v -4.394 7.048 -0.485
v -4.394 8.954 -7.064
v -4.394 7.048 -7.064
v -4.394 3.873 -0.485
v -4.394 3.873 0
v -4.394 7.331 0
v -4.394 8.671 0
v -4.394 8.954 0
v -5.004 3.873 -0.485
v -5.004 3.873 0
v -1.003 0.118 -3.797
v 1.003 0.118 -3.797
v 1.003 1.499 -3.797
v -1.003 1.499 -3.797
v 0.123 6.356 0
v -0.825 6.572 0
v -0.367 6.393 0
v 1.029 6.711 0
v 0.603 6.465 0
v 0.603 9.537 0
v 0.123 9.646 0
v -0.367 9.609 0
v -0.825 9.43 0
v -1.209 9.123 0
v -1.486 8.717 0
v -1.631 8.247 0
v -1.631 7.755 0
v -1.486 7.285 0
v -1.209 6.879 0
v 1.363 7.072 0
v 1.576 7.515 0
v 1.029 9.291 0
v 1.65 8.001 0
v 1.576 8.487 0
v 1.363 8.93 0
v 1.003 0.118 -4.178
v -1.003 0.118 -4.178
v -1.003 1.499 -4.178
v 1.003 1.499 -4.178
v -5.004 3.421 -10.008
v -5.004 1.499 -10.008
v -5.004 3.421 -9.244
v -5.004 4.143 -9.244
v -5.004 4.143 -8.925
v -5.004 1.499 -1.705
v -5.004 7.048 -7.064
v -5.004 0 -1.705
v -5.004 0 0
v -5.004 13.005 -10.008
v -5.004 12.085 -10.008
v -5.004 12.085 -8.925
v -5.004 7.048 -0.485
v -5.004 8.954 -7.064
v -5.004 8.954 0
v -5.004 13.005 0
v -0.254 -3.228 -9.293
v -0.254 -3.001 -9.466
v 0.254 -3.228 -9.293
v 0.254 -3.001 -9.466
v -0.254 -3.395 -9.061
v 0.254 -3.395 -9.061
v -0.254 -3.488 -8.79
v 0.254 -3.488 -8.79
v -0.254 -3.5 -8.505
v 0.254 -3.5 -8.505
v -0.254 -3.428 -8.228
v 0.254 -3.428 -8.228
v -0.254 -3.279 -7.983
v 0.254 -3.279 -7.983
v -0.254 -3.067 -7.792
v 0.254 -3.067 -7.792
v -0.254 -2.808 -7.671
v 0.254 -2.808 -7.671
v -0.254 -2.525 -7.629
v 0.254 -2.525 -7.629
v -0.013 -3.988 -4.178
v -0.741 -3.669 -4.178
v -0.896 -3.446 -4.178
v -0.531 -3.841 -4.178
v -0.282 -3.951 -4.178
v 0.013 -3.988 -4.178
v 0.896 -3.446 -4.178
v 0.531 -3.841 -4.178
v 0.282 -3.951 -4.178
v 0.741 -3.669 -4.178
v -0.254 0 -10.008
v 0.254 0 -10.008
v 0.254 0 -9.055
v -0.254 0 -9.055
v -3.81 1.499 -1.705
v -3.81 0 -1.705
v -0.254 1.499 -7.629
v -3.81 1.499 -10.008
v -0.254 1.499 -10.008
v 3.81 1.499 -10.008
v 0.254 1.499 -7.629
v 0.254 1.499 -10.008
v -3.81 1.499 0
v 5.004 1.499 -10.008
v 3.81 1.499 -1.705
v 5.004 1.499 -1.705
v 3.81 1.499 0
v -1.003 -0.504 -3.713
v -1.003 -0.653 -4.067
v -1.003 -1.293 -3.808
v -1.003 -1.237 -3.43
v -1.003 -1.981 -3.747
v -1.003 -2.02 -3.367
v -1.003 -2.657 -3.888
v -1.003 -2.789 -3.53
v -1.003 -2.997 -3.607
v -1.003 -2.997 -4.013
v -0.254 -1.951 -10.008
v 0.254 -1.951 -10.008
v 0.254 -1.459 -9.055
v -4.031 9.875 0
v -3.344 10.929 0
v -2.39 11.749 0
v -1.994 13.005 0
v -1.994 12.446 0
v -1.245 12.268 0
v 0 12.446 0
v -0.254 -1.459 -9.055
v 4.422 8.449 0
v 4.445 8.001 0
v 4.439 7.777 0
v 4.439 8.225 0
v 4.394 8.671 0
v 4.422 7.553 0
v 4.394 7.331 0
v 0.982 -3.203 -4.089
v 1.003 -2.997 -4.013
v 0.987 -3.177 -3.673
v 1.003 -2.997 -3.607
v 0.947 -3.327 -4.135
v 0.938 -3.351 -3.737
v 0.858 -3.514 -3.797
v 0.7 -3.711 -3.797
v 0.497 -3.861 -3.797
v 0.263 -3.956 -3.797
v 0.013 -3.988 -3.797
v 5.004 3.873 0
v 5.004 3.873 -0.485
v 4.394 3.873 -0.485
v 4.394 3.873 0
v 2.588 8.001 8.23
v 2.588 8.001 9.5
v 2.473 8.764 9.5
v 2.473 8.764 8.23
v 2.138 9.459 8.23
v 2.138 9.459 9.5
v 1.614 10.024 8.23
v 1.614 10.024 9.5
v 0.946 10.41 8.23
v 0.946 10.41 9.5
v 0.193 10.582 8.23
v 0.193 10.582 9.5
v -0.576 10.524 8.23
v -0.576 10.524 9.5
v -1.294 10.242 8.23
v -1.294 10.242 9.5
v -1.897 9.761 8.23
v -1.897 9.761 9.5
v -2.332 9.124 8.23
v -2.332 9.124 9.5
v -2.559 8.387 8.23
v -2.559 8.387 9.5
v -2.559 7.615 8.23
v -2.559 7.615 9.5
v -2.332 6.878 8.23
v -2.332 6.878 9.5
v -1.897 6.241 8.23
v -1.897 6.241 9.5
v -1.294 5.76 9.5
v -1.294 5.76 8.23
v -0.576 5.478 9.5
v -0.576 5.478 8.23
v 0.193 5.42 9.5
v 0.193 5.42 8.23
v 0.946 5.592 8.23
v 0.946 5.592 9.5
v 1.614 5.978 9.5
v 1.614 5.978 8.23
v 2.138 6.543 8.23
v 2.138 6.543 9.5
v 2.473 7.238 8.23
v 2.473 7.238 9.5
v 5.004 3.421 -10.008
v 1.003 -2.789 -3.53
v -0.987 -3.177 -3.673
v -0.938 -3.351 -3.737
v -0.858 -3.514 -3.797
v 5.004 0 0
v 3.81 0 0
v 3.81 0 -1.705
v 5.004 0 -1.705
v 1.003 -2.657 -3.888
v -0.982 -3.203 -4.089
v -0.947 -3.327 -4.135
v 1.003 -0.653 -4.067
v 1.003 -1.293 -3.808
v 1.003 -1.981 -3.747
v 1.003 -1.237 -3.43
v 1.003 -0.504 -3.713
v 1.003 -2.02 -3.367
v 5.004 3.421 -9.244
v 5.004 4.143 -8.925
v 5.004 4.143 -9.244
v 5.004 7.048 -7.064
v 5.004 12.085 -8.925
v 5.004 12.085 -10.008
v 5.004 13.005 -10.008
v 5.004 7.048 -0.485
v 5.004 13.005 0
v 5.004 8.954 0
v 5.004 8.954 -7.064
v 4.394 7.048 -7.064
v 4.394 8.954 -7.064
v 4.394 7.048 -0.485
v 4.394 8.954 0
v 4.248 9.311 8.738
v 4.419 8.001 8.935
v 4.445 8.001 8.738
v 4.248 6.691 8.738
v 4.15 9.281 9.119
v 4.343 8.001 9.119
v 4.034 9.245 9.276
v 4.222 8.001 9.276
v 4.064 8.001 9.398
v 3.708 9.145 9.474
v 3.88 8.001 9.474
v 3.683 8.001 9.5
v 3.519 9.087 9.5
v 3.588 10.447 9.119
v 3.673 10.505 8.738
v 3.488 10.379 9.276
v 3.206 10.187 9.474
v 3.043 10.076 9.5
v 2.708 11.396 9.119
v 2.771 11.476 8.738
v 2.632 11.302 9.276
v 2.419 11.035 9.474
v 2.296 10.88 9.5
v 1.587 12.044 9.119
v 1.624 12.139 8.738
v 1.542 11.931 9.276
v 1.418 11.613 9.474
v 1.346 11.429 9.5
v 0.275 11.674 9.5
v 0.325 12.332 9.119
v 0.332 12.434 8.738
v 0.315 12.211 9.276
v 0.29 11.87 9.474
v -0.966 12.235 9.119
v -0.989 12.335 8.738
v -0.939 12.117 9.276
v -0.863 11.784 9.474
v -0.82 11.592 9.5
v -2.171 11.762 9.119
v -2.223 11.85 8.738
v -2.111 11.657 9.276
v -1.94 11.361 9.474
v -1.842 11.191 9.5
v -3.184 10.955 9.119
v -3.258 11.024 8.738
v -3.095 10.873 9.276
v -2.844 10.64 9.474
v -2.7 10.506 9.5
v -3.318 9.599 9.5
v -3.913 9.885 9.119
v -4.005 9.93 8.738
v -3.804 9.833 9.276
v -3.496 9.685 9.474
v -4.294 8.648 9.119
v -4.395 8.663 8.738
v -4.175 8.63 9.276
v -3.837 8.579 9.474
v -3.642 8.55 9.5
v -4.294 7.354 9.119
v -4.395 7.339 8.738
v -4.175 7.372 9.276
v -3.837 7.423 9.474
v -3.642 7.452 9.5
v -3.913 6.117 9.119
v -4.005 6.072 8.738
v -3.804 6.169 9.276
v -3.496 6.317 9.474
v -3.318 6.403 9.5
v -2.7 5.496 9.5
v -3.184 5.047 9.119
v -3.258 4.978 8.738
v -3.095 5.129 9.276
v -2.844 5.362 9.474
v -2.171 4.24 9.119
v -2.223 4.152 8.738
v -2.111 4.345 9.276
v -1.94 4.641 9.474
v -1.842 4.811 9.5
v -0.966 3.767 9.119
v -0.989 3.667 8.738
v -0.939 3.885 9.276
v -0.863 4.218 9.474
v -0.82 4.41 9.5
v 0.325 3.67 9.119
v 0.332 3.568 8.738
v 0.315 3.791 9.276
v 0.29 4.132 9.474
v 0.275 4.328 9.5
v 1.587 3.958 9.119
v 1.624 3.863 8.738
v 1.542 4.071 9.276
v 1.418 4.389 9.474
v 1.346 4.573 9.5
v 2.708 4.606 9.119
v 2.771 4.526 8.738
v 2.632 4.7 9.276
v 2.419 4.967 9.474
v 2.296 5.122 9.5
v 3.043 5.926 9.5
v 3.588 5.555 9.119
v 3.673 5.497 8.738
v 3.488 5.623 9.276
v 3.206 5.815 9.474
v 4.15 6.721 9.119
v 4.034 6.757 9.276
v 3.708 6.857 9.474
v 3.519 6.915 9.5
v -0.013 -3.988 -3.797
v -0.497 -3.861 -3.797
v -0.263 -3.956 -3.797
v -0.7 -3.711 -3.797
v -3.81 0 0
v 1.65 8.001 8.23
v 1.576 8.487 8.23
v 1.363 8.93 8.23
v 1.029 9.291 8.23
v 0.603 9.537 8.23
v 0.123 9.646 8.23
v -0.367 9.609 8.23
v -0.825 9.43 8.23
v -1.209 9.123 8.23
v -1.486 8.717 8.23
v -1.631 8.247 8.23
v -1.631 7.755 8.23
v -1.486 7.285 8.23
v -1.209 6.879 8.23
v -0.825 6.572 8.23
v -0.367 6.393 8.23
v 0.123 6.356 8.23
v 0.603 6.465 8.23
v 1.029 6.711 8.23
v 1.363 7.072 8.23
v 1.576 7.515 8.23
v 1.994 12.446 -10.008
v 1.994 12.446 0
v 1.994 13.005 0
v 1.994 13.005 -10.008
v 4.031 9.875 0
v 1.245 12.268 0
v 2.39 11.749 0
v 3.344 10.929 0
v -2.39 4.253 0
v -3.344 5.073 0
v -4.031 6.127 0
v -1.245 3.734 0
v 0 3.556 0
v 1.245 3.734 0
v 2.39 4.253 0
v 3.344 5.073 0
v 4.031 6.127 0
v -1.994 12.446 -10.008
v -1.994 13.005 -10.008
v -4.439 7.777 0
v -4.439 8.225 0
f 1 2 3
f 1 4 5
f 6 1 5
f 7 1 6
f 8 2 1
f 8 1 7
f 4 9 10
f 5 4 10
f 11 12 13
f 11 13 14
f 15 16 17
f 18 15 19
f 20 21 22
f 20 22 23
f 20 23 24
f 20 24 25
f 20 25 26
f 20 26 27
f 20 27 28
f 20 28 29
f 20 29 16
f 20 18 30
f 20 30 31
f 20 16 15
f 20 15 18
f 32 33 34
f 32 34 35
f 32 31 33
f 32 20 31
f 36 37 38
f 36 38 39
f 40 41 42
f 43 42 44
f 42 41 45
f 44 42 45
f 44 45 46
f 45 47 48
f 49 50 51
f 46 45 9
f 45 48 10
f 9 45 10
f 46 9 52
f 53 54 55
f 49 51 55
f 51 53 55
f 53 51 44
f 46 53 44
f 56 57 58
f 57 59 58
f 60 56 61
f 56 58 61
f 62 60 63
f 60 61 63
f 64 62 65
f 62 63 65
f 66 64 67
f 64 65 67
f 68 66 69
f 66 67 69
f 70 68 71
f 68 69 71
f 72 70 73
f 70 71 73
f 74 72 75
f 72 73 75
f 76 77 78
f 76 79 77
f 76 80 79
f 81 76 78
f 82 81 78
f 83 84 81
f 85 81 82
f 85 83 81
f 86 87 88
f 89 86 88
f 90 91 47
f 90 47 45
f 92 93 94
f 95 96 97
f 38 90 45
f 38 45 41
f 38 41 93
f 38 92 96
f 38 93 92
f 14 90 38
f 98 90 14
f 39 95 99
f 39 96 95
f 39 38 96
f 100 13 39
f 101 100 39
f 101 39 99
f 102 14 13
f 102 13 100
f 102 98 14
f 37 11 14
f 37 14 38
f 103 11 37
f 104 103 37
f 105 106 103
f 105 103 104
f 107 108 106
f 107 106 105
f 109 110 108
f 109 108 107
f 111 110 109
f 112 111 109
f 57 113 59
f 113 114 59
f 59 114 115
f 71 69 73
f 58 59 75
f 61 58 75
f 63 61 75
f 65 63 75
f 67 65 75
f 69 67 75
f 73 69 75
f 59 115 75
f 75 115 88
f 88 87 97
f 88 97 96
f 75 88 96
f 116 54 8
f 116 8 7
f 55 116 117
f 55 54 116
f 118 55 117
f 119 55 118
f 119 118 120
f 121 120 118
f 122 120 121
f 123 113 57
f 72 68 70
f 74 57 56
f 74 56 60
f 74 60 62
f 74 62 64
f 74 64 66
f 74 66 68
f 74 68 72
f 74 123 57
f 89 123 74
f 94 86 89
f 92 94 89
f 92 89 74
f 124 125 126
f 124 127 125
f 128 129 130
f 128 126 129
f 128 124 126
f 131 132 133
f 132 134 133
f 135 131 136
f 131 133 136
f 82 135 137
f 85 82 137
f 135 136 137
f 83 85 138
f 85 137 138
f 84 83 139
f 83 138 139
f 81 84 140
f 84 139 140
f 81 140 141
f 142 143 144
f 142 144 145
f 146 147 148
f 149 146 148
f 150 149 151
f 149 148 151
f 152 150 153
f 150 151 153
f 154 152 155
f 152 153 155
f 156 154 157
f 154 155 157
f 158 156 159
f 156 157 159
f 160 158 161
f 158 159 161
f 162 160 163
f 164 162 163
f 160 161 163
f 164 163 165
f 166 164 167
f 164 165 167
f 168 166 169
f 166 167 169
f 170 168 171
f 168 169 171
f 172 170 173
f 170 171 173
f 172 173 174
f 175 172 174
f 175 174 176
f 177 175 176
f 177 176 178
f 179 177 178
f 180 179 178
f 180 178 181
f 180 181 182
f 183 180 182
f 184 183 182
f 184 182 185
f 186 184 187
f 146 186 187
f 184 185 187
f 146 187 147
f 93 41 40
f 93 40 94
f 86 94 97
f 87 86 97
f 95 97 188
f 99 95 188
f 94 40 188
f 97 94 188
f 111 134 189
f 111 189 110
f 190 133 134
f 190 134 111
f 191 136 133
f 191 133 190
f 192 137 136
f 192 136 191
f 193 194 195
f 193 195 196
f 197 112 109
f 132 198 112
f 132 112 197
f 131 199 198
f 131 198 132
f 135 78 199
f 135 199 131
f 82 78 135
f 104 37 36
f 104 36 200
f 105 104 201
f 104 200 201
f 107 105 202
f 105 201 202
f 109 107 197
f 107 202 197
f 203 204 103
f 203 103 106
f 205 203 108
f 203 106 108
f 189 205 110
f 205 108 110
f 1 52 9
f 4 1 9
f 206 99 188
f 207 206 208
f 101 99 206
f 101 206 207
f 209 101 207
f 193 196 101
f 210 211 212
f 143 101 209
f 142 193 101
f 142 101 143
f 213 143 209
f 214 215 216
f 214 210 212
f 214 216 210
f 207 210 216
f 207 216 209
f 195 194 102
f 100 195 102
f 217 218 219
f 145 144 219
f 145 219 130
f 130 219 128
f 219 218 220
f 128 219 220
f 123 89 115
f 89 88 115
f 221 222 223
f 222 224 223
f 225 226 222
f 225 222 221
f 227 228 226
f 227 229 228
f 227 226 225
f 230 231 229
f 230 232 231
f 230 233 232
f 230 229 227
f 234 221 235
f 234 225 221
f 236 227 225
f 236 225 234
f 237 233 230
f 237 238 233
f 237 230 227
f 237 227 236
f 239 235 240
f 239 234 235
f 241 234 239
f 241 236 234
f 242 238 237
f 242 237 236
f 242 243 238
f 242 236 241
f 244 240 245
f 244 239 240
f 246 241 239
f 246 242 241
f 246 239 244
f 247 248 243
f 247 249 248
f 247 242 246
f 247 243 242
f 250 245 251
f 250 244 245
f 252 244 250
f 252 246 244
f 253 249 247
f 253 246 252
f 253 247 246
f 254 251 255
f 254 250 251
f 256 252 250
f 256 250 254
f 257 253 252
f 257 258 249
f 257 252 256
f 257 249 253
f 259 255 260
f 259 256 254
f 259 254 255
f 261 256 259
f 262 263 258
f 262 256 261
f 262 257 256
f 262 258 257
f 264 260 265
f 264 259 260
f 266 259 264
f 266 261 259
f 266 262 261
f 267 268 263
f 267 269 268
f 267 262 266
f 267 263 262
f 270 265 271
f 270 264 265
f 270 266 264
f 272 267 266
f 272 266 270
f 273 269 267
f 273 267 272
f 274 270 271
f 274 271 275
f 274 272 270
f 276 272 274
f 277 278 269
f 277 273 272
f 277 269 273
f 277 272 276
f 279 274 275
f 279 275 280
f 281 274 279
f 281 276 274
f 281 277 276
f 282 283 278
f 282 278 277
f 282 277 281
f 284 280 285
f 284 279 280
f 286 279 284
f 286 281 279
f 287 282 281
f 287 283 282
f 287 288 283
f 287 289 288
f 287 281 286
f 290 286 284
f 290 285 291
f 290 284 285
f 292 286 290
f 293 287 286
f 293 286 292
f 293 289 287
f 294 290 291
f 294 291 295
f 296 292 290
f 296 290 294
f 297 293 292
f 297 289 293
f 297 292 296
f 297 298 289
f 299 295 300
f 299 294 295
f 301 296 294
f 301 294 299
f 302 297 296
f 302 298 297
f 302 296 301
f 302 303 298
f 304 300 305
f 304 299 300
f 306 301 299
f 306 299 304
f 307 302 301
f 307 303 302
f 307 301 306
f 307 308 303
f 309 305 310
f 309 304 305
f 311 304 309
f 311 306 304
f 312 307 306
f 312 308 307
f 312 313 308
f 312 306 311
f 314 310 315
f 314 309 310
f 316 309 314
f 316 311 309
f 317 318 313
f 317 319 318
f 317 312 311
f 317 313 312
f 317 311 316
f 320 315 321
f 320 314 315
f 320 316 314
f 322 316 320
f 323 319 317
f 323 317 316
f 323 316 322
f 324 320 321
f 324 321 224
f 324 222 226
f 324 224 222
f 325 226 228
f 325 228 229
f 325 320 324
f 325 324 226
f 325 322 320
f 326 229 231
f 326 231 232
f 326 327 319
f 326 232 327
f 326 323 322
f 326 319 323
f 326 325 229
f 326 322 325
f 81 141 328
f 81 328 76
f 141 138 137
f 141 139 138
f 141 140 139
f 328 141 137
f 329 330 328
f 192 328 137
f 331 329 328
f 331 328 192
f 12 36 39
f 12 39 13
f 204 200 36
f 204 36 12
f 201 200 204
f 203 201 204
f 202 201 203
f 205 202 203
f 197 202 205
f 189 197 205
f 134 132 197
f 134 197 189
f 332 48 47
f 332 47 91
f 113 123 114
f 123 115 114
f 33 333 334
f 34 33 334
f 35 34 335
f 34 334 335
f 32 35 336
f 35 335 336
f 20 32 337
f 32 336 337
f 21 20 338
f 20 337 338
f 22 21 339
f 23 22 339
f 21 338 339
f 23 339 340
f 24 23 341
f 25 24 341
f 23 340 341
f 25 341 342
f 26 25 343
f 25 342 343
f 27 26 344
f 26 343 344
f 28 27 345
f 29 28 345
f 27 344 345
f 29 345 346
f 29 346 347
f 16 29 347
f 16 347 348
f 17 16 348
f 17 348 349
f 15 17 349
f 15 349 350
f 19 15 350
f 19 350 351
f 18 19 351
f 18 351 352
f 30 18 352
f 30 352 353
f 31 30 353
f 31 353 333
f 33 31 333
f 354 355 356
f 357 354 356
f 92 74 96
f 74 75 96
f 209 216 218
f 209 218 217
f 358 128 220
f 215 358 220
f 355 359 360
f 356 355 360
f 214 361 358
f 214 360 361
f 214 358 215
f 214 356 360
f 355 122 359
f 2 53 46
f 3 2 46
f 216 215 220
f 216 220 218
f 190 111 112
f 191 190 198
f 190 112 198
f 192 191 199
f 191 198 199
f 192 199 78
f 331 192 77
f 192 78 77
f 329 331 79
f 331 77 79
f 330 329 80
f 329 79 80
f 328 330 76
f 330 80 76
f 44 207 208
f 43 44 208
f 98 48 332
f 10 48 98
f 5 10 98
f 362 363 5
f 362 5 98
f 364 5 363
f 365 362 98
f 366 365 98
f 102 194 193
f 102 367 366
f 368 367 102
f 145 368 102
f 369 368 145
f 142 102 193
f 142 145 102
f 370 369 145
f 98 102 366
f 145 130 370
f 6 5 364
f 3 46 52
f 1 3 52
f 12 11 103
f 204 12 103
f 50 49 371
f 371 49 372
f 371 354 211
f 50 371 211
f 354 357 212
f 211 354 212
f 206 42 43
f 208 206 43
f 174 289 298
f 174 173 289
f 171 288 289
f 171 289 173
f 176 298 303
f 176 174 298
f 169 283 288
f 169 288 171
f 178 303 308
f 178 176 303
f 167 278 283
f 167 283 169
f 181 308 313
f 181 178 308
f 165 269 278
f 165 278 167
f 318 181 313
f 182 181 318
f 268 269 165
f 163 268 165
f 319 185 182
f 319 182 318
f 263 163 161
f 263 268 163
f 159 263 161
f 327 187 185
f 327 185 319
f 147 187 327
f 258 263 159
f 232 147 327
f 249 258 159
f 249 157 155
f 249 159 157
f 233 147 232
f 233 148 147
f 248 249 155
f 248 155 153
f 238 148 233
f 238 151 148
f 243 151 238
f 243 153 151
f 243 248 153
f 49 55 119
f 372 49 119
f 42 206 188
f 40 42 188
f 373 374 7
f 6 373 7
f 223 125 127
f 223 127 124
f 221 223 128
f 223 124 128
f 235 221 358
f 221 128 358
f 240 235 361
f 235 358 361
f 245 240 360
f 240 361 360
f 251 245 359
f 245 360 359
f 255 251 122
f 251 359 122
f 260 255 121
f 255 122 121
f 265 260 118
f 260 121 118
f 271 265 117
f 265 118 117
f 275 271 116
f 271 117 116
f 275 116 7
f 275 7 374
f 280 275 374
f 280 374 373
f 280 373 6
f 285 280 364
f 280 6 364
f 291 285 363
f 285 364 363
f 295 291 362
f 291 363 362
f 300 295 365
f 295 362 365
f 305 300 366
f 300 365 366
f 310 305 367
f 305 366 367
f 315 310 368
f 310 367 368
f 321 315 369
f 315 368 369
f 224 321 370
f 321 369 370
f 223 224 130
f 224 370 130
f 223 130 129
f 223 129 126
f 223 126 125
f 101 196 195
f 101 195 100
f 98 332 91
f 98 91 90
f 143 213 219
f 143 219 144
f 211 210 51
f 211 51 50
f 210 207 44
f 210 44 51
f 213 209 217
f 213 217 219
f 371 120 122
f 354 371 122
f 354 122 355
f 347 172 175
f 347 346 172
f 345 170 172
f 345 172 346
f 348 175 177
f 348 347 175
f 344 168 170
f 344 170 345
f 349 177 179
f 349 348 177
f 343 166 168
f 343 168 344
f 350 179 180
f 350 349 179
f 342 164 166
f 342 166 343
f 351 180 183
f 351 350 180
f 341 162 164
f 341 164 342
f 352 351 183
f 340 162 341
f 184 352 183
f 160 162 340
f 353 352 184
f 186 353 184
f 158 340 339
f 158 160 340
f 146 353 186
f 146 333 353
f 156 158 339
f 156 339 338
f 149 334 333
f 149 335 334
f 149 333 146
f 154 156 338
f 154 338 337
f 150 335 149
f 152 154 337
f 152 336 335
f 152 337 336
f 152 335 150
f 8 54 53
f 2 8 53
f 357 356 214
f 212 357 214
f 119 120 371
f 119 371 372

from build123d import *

# Parameters (mm, degrees)
SKETCH1_W          = 10.0076
SKETCH1_H          = 13.0048
EXTRUDE1_DEPTH     = 10.0076
SKETCH2_R          = 4.445
EXTRUDE2_DEPTH     = 9.4996
FILLET1_R          = 0.762
SKETCH3_R          = 1.64973
CUT_EXTRUDE1_DEPTH = 9.4996
CUT_EXTRUDE2_DEPTH = 0.6096
SKETCH5_W          = 1.082217623
SKETCH5_H          = 7.941923042
CUT_EXTRUDE3_DEPTH = 11.0076
SKETCH6_W          = 7.62
SKETCH6_H          = 1.4986
CUT_EXTRUDE4_DEPTH = 11.0076
SKETCH7_R          = 2.588003294
CUT_EXTRUDE5_DEPTH = 1.27
SKETCH8_W          = 3.9878
SKETCH8_H          = 0.5588
CUT_EXTRUDE6_DEPTH = 11.0076
SKETCH10_W         = 8.302680101
SKETCH10_H         = 1.4986
CUT_EXTRUDE8_DEPTH = 11.0076
SKETCH11_W         = 0.763867388
SKETCH11_H         = 0.721519404
CUT_EXTRUDE9_DEPTH = 11.0076
SKETCH12_W         = 2.0066
SKETCH12_H         = 0.381
FILLET2_R          = 0.9906
EXTRUDE3_DEPTH     = 0.254


with BuildPart() as part:
    # Sketch1 → Extrude1 (new body)
    with BuildSketch(Plane.XY):
        with Locations((0, 6.5024)):
            Rectangle(SKETCH1_W, SKETCH1_H)
    extrude(amount=-EXTRUDE1_DEPTH)

    # Sketch2 → Extrude2 (add)
    with BuildSketch(Plane.XY):
        with Locations((0, 8.001)):
            Circle(SKETCH2_R)
    extrude(amount=EXTRUDE2_DEPTH)

    # Fillet1
    fillet1_edges = [part.edges().sort_by_distance(p)[0] for p in [
        (-4.445, 8.001, 9.4996),
    ]]
    fillet(fillet1_edges, radius=FILLET1_R)

    # Sketch3 → Cut-Extrude1 (cut)
    with BuildSketch(Plane.XY.offset(9.4996)):
        with Locations((0, 8.001)):
            Circle(SKETCH3_R)
    extrude(amount=-CUT_EXTRUDE1_DEPTH, mode=Mode.SUBTRACT)

    # Sketch4 → Cut-Extrude2 (cut)
    with BuildSketch(Plane(origin=(5.0038, 0, 0), x_dir=(0, 0, -1), z_dir=(1, 0, 0))):
        Polygon((0, 8.9535), (7.063951239, 8.9535), (7.063951239, 7.0485), (0.484947525, 7.0485), (0.484947525, 3.872808147), (0, 3.872808147), align=None)
    cut_extrude2 = extrude(amount=-CUT_EXTRUDE2_DEPTH, mode=Mode.SUBTRACT)

    # Sketch5 → Cut-Extrude3 (cut, through all)
    with BuildSketch(Plane(origin=(5.0038, 0, 0), x_dir=(0, 0, -1), z_dir=(1, 0, 0))):
        with Locations((9.466491189, 8.113930335)):
            Rectangle(SKETCH5_W, SKETCH5_H)
    extrude(amount=-CUT_EXTRUDE3_DEPTH, mode=Mode.SUBTRACT)

    # Sketch6 → Cut-Extrude4 (cut, through all)
    with BuildSketch(Plane.XY):
        with Locations((0, 0.7493)):
            Rectangle(SKETCH6_W, SKETCH6_H)
    extrude(amount=-CUT_EXTRUDE4_DEPTH, mode=Mode.SUBTRACT)

    # Sketch7 → Cut-Extrude5 (cut)
    with BuildSketch(Plane.XY.offset(9.4996)):
        with Locations((0, 8.001)):
            Circle(SKETCH7_R)
    extrude(amount=-CUT_EXTRUDE5_DEPTH, mode=Mode.SUBTRACT)

    # Sketch8 → Cut-Extrude6 (cut, through all)
    with BuildSketch(Plane.XY):
        with Locations((0, 12.7254)):
            Rectangle(SKETCH8_W, SKETCH8_H)
    extrude(amount=-CUT_EXTRUDE6_DEPTH, mode=Mode.SUBTRACT)

    # Mirror1: Cut-Extrude2 across plane
    add(cut_extrude2.mirror(Plane(origin=(0, 0, 0), x_dir=(0, 0, 1), z_dir=(1, 0, 0))), mode=Mode.SUBTRACT)

    # Sketch10 → Cut-Extrude8 (cut, through all)
    with BuildSketch(Plane(origin=(5.0038, 0, 0), x_dir=(0, 0, -1), z_dir=(1, 0, 0))):
        with Locations((5.85625995, 0.7493)):
            Rectangle(SKETCH10_W, SKETCH10_H)
    extrude(amount=-CUT_EXTRUDE8_DEPTH, mode=Mode.SUBTRACT)

    # Sketch11 → Cut-Extrude9 (cut, through all)
    with BuildSketch(Plane(origin=(5.0038, 0, 0), x_dir=(0, 0, -1), z_dir=(1, 0, 0))):
        with Locations((9.625666306, 3.782209112)):
            Rectangle(SKETCH11_W, SKETCH11_H)
    extrude(amount=-CUT_EXTRUDE9_DEPTH, mode=Mode.SUBTRACT)

    # Sweep1: sweep along a path in Sketch13
    with BuildLine(Plane(origin=(0, 0, 0), x_dir=(0, 0, -1), z_dir=(1, 0, 0))) as sweep1_path:
        Line((3.9878, 1.4986), (3.9878, 0.118233573))
        ThreePointArc((3.9878, 0.118233573), (3.963359224, -0.233279995), (3.890507253, -0.578028788))
        ThreePointArc((3.890507253, -0.578028788), (3.561195264, -1.630409905), (3.70889827, -2.723175307))
        Line((3.70889827, -2.723175307), (3.9878, -3.4798))
        Line((3.9878, -3.4798), (3.9878, -3.9878))
    # Sketch12 → Sweep1 (sweep)
    with BuildSketch(Plane.XZ.offset(-1.4986)):
        with Locations((0, -3.9878)):
            Rectangle(SKETCH12_W, SKETCH12_H)
    sweep(path=sweep1_path.line, transition=Transition.RIGHT)

    # Fillet2
    fillet2_edges = [part.edges().sort_by_distance(p)[0] for p in [
        (1.0033, -3.9878, -3.9878),
        (-1.0033, -3.9878, -3.9878),
    ]]
    fillet(fillet2_edges, radius=FILLET2_R)

    # Sketch14 → Extrude3 (add, symmetric)
    with BuildSketch(Plane(origin=(0, 0, 0), x_dir=(0, 0, -1), z_dir=(1, 0, 0))):
        with BuildLine():
            Line((10.007599936, 0), (9.055129464, 0))
            Line((9.055129464, 0), (9.055129464, -1.459458075))
            Line((9.055129464, -1.459458075), (10.007599936, -1.950513398))
            Line((10.007599936, -1.950513398), (9.466255271, -3.000527083))
            ThreePointArc((9.466255271, -3.000527083), (8.363488428, -3.473928976), (7.628868664, -2.52496224))
            Line((7.628868664, -2.52496224), (7.628868664, 1.4986))
            Line((7.628868664, 1.4986), (10.007599936, 1.4986))
            Line((10.007599936, 1.4986), (10.007599936, 0))
        make_face()
    extrude(amount=EXTRUDE3_DEPTH, both=True)


solid = part.part
